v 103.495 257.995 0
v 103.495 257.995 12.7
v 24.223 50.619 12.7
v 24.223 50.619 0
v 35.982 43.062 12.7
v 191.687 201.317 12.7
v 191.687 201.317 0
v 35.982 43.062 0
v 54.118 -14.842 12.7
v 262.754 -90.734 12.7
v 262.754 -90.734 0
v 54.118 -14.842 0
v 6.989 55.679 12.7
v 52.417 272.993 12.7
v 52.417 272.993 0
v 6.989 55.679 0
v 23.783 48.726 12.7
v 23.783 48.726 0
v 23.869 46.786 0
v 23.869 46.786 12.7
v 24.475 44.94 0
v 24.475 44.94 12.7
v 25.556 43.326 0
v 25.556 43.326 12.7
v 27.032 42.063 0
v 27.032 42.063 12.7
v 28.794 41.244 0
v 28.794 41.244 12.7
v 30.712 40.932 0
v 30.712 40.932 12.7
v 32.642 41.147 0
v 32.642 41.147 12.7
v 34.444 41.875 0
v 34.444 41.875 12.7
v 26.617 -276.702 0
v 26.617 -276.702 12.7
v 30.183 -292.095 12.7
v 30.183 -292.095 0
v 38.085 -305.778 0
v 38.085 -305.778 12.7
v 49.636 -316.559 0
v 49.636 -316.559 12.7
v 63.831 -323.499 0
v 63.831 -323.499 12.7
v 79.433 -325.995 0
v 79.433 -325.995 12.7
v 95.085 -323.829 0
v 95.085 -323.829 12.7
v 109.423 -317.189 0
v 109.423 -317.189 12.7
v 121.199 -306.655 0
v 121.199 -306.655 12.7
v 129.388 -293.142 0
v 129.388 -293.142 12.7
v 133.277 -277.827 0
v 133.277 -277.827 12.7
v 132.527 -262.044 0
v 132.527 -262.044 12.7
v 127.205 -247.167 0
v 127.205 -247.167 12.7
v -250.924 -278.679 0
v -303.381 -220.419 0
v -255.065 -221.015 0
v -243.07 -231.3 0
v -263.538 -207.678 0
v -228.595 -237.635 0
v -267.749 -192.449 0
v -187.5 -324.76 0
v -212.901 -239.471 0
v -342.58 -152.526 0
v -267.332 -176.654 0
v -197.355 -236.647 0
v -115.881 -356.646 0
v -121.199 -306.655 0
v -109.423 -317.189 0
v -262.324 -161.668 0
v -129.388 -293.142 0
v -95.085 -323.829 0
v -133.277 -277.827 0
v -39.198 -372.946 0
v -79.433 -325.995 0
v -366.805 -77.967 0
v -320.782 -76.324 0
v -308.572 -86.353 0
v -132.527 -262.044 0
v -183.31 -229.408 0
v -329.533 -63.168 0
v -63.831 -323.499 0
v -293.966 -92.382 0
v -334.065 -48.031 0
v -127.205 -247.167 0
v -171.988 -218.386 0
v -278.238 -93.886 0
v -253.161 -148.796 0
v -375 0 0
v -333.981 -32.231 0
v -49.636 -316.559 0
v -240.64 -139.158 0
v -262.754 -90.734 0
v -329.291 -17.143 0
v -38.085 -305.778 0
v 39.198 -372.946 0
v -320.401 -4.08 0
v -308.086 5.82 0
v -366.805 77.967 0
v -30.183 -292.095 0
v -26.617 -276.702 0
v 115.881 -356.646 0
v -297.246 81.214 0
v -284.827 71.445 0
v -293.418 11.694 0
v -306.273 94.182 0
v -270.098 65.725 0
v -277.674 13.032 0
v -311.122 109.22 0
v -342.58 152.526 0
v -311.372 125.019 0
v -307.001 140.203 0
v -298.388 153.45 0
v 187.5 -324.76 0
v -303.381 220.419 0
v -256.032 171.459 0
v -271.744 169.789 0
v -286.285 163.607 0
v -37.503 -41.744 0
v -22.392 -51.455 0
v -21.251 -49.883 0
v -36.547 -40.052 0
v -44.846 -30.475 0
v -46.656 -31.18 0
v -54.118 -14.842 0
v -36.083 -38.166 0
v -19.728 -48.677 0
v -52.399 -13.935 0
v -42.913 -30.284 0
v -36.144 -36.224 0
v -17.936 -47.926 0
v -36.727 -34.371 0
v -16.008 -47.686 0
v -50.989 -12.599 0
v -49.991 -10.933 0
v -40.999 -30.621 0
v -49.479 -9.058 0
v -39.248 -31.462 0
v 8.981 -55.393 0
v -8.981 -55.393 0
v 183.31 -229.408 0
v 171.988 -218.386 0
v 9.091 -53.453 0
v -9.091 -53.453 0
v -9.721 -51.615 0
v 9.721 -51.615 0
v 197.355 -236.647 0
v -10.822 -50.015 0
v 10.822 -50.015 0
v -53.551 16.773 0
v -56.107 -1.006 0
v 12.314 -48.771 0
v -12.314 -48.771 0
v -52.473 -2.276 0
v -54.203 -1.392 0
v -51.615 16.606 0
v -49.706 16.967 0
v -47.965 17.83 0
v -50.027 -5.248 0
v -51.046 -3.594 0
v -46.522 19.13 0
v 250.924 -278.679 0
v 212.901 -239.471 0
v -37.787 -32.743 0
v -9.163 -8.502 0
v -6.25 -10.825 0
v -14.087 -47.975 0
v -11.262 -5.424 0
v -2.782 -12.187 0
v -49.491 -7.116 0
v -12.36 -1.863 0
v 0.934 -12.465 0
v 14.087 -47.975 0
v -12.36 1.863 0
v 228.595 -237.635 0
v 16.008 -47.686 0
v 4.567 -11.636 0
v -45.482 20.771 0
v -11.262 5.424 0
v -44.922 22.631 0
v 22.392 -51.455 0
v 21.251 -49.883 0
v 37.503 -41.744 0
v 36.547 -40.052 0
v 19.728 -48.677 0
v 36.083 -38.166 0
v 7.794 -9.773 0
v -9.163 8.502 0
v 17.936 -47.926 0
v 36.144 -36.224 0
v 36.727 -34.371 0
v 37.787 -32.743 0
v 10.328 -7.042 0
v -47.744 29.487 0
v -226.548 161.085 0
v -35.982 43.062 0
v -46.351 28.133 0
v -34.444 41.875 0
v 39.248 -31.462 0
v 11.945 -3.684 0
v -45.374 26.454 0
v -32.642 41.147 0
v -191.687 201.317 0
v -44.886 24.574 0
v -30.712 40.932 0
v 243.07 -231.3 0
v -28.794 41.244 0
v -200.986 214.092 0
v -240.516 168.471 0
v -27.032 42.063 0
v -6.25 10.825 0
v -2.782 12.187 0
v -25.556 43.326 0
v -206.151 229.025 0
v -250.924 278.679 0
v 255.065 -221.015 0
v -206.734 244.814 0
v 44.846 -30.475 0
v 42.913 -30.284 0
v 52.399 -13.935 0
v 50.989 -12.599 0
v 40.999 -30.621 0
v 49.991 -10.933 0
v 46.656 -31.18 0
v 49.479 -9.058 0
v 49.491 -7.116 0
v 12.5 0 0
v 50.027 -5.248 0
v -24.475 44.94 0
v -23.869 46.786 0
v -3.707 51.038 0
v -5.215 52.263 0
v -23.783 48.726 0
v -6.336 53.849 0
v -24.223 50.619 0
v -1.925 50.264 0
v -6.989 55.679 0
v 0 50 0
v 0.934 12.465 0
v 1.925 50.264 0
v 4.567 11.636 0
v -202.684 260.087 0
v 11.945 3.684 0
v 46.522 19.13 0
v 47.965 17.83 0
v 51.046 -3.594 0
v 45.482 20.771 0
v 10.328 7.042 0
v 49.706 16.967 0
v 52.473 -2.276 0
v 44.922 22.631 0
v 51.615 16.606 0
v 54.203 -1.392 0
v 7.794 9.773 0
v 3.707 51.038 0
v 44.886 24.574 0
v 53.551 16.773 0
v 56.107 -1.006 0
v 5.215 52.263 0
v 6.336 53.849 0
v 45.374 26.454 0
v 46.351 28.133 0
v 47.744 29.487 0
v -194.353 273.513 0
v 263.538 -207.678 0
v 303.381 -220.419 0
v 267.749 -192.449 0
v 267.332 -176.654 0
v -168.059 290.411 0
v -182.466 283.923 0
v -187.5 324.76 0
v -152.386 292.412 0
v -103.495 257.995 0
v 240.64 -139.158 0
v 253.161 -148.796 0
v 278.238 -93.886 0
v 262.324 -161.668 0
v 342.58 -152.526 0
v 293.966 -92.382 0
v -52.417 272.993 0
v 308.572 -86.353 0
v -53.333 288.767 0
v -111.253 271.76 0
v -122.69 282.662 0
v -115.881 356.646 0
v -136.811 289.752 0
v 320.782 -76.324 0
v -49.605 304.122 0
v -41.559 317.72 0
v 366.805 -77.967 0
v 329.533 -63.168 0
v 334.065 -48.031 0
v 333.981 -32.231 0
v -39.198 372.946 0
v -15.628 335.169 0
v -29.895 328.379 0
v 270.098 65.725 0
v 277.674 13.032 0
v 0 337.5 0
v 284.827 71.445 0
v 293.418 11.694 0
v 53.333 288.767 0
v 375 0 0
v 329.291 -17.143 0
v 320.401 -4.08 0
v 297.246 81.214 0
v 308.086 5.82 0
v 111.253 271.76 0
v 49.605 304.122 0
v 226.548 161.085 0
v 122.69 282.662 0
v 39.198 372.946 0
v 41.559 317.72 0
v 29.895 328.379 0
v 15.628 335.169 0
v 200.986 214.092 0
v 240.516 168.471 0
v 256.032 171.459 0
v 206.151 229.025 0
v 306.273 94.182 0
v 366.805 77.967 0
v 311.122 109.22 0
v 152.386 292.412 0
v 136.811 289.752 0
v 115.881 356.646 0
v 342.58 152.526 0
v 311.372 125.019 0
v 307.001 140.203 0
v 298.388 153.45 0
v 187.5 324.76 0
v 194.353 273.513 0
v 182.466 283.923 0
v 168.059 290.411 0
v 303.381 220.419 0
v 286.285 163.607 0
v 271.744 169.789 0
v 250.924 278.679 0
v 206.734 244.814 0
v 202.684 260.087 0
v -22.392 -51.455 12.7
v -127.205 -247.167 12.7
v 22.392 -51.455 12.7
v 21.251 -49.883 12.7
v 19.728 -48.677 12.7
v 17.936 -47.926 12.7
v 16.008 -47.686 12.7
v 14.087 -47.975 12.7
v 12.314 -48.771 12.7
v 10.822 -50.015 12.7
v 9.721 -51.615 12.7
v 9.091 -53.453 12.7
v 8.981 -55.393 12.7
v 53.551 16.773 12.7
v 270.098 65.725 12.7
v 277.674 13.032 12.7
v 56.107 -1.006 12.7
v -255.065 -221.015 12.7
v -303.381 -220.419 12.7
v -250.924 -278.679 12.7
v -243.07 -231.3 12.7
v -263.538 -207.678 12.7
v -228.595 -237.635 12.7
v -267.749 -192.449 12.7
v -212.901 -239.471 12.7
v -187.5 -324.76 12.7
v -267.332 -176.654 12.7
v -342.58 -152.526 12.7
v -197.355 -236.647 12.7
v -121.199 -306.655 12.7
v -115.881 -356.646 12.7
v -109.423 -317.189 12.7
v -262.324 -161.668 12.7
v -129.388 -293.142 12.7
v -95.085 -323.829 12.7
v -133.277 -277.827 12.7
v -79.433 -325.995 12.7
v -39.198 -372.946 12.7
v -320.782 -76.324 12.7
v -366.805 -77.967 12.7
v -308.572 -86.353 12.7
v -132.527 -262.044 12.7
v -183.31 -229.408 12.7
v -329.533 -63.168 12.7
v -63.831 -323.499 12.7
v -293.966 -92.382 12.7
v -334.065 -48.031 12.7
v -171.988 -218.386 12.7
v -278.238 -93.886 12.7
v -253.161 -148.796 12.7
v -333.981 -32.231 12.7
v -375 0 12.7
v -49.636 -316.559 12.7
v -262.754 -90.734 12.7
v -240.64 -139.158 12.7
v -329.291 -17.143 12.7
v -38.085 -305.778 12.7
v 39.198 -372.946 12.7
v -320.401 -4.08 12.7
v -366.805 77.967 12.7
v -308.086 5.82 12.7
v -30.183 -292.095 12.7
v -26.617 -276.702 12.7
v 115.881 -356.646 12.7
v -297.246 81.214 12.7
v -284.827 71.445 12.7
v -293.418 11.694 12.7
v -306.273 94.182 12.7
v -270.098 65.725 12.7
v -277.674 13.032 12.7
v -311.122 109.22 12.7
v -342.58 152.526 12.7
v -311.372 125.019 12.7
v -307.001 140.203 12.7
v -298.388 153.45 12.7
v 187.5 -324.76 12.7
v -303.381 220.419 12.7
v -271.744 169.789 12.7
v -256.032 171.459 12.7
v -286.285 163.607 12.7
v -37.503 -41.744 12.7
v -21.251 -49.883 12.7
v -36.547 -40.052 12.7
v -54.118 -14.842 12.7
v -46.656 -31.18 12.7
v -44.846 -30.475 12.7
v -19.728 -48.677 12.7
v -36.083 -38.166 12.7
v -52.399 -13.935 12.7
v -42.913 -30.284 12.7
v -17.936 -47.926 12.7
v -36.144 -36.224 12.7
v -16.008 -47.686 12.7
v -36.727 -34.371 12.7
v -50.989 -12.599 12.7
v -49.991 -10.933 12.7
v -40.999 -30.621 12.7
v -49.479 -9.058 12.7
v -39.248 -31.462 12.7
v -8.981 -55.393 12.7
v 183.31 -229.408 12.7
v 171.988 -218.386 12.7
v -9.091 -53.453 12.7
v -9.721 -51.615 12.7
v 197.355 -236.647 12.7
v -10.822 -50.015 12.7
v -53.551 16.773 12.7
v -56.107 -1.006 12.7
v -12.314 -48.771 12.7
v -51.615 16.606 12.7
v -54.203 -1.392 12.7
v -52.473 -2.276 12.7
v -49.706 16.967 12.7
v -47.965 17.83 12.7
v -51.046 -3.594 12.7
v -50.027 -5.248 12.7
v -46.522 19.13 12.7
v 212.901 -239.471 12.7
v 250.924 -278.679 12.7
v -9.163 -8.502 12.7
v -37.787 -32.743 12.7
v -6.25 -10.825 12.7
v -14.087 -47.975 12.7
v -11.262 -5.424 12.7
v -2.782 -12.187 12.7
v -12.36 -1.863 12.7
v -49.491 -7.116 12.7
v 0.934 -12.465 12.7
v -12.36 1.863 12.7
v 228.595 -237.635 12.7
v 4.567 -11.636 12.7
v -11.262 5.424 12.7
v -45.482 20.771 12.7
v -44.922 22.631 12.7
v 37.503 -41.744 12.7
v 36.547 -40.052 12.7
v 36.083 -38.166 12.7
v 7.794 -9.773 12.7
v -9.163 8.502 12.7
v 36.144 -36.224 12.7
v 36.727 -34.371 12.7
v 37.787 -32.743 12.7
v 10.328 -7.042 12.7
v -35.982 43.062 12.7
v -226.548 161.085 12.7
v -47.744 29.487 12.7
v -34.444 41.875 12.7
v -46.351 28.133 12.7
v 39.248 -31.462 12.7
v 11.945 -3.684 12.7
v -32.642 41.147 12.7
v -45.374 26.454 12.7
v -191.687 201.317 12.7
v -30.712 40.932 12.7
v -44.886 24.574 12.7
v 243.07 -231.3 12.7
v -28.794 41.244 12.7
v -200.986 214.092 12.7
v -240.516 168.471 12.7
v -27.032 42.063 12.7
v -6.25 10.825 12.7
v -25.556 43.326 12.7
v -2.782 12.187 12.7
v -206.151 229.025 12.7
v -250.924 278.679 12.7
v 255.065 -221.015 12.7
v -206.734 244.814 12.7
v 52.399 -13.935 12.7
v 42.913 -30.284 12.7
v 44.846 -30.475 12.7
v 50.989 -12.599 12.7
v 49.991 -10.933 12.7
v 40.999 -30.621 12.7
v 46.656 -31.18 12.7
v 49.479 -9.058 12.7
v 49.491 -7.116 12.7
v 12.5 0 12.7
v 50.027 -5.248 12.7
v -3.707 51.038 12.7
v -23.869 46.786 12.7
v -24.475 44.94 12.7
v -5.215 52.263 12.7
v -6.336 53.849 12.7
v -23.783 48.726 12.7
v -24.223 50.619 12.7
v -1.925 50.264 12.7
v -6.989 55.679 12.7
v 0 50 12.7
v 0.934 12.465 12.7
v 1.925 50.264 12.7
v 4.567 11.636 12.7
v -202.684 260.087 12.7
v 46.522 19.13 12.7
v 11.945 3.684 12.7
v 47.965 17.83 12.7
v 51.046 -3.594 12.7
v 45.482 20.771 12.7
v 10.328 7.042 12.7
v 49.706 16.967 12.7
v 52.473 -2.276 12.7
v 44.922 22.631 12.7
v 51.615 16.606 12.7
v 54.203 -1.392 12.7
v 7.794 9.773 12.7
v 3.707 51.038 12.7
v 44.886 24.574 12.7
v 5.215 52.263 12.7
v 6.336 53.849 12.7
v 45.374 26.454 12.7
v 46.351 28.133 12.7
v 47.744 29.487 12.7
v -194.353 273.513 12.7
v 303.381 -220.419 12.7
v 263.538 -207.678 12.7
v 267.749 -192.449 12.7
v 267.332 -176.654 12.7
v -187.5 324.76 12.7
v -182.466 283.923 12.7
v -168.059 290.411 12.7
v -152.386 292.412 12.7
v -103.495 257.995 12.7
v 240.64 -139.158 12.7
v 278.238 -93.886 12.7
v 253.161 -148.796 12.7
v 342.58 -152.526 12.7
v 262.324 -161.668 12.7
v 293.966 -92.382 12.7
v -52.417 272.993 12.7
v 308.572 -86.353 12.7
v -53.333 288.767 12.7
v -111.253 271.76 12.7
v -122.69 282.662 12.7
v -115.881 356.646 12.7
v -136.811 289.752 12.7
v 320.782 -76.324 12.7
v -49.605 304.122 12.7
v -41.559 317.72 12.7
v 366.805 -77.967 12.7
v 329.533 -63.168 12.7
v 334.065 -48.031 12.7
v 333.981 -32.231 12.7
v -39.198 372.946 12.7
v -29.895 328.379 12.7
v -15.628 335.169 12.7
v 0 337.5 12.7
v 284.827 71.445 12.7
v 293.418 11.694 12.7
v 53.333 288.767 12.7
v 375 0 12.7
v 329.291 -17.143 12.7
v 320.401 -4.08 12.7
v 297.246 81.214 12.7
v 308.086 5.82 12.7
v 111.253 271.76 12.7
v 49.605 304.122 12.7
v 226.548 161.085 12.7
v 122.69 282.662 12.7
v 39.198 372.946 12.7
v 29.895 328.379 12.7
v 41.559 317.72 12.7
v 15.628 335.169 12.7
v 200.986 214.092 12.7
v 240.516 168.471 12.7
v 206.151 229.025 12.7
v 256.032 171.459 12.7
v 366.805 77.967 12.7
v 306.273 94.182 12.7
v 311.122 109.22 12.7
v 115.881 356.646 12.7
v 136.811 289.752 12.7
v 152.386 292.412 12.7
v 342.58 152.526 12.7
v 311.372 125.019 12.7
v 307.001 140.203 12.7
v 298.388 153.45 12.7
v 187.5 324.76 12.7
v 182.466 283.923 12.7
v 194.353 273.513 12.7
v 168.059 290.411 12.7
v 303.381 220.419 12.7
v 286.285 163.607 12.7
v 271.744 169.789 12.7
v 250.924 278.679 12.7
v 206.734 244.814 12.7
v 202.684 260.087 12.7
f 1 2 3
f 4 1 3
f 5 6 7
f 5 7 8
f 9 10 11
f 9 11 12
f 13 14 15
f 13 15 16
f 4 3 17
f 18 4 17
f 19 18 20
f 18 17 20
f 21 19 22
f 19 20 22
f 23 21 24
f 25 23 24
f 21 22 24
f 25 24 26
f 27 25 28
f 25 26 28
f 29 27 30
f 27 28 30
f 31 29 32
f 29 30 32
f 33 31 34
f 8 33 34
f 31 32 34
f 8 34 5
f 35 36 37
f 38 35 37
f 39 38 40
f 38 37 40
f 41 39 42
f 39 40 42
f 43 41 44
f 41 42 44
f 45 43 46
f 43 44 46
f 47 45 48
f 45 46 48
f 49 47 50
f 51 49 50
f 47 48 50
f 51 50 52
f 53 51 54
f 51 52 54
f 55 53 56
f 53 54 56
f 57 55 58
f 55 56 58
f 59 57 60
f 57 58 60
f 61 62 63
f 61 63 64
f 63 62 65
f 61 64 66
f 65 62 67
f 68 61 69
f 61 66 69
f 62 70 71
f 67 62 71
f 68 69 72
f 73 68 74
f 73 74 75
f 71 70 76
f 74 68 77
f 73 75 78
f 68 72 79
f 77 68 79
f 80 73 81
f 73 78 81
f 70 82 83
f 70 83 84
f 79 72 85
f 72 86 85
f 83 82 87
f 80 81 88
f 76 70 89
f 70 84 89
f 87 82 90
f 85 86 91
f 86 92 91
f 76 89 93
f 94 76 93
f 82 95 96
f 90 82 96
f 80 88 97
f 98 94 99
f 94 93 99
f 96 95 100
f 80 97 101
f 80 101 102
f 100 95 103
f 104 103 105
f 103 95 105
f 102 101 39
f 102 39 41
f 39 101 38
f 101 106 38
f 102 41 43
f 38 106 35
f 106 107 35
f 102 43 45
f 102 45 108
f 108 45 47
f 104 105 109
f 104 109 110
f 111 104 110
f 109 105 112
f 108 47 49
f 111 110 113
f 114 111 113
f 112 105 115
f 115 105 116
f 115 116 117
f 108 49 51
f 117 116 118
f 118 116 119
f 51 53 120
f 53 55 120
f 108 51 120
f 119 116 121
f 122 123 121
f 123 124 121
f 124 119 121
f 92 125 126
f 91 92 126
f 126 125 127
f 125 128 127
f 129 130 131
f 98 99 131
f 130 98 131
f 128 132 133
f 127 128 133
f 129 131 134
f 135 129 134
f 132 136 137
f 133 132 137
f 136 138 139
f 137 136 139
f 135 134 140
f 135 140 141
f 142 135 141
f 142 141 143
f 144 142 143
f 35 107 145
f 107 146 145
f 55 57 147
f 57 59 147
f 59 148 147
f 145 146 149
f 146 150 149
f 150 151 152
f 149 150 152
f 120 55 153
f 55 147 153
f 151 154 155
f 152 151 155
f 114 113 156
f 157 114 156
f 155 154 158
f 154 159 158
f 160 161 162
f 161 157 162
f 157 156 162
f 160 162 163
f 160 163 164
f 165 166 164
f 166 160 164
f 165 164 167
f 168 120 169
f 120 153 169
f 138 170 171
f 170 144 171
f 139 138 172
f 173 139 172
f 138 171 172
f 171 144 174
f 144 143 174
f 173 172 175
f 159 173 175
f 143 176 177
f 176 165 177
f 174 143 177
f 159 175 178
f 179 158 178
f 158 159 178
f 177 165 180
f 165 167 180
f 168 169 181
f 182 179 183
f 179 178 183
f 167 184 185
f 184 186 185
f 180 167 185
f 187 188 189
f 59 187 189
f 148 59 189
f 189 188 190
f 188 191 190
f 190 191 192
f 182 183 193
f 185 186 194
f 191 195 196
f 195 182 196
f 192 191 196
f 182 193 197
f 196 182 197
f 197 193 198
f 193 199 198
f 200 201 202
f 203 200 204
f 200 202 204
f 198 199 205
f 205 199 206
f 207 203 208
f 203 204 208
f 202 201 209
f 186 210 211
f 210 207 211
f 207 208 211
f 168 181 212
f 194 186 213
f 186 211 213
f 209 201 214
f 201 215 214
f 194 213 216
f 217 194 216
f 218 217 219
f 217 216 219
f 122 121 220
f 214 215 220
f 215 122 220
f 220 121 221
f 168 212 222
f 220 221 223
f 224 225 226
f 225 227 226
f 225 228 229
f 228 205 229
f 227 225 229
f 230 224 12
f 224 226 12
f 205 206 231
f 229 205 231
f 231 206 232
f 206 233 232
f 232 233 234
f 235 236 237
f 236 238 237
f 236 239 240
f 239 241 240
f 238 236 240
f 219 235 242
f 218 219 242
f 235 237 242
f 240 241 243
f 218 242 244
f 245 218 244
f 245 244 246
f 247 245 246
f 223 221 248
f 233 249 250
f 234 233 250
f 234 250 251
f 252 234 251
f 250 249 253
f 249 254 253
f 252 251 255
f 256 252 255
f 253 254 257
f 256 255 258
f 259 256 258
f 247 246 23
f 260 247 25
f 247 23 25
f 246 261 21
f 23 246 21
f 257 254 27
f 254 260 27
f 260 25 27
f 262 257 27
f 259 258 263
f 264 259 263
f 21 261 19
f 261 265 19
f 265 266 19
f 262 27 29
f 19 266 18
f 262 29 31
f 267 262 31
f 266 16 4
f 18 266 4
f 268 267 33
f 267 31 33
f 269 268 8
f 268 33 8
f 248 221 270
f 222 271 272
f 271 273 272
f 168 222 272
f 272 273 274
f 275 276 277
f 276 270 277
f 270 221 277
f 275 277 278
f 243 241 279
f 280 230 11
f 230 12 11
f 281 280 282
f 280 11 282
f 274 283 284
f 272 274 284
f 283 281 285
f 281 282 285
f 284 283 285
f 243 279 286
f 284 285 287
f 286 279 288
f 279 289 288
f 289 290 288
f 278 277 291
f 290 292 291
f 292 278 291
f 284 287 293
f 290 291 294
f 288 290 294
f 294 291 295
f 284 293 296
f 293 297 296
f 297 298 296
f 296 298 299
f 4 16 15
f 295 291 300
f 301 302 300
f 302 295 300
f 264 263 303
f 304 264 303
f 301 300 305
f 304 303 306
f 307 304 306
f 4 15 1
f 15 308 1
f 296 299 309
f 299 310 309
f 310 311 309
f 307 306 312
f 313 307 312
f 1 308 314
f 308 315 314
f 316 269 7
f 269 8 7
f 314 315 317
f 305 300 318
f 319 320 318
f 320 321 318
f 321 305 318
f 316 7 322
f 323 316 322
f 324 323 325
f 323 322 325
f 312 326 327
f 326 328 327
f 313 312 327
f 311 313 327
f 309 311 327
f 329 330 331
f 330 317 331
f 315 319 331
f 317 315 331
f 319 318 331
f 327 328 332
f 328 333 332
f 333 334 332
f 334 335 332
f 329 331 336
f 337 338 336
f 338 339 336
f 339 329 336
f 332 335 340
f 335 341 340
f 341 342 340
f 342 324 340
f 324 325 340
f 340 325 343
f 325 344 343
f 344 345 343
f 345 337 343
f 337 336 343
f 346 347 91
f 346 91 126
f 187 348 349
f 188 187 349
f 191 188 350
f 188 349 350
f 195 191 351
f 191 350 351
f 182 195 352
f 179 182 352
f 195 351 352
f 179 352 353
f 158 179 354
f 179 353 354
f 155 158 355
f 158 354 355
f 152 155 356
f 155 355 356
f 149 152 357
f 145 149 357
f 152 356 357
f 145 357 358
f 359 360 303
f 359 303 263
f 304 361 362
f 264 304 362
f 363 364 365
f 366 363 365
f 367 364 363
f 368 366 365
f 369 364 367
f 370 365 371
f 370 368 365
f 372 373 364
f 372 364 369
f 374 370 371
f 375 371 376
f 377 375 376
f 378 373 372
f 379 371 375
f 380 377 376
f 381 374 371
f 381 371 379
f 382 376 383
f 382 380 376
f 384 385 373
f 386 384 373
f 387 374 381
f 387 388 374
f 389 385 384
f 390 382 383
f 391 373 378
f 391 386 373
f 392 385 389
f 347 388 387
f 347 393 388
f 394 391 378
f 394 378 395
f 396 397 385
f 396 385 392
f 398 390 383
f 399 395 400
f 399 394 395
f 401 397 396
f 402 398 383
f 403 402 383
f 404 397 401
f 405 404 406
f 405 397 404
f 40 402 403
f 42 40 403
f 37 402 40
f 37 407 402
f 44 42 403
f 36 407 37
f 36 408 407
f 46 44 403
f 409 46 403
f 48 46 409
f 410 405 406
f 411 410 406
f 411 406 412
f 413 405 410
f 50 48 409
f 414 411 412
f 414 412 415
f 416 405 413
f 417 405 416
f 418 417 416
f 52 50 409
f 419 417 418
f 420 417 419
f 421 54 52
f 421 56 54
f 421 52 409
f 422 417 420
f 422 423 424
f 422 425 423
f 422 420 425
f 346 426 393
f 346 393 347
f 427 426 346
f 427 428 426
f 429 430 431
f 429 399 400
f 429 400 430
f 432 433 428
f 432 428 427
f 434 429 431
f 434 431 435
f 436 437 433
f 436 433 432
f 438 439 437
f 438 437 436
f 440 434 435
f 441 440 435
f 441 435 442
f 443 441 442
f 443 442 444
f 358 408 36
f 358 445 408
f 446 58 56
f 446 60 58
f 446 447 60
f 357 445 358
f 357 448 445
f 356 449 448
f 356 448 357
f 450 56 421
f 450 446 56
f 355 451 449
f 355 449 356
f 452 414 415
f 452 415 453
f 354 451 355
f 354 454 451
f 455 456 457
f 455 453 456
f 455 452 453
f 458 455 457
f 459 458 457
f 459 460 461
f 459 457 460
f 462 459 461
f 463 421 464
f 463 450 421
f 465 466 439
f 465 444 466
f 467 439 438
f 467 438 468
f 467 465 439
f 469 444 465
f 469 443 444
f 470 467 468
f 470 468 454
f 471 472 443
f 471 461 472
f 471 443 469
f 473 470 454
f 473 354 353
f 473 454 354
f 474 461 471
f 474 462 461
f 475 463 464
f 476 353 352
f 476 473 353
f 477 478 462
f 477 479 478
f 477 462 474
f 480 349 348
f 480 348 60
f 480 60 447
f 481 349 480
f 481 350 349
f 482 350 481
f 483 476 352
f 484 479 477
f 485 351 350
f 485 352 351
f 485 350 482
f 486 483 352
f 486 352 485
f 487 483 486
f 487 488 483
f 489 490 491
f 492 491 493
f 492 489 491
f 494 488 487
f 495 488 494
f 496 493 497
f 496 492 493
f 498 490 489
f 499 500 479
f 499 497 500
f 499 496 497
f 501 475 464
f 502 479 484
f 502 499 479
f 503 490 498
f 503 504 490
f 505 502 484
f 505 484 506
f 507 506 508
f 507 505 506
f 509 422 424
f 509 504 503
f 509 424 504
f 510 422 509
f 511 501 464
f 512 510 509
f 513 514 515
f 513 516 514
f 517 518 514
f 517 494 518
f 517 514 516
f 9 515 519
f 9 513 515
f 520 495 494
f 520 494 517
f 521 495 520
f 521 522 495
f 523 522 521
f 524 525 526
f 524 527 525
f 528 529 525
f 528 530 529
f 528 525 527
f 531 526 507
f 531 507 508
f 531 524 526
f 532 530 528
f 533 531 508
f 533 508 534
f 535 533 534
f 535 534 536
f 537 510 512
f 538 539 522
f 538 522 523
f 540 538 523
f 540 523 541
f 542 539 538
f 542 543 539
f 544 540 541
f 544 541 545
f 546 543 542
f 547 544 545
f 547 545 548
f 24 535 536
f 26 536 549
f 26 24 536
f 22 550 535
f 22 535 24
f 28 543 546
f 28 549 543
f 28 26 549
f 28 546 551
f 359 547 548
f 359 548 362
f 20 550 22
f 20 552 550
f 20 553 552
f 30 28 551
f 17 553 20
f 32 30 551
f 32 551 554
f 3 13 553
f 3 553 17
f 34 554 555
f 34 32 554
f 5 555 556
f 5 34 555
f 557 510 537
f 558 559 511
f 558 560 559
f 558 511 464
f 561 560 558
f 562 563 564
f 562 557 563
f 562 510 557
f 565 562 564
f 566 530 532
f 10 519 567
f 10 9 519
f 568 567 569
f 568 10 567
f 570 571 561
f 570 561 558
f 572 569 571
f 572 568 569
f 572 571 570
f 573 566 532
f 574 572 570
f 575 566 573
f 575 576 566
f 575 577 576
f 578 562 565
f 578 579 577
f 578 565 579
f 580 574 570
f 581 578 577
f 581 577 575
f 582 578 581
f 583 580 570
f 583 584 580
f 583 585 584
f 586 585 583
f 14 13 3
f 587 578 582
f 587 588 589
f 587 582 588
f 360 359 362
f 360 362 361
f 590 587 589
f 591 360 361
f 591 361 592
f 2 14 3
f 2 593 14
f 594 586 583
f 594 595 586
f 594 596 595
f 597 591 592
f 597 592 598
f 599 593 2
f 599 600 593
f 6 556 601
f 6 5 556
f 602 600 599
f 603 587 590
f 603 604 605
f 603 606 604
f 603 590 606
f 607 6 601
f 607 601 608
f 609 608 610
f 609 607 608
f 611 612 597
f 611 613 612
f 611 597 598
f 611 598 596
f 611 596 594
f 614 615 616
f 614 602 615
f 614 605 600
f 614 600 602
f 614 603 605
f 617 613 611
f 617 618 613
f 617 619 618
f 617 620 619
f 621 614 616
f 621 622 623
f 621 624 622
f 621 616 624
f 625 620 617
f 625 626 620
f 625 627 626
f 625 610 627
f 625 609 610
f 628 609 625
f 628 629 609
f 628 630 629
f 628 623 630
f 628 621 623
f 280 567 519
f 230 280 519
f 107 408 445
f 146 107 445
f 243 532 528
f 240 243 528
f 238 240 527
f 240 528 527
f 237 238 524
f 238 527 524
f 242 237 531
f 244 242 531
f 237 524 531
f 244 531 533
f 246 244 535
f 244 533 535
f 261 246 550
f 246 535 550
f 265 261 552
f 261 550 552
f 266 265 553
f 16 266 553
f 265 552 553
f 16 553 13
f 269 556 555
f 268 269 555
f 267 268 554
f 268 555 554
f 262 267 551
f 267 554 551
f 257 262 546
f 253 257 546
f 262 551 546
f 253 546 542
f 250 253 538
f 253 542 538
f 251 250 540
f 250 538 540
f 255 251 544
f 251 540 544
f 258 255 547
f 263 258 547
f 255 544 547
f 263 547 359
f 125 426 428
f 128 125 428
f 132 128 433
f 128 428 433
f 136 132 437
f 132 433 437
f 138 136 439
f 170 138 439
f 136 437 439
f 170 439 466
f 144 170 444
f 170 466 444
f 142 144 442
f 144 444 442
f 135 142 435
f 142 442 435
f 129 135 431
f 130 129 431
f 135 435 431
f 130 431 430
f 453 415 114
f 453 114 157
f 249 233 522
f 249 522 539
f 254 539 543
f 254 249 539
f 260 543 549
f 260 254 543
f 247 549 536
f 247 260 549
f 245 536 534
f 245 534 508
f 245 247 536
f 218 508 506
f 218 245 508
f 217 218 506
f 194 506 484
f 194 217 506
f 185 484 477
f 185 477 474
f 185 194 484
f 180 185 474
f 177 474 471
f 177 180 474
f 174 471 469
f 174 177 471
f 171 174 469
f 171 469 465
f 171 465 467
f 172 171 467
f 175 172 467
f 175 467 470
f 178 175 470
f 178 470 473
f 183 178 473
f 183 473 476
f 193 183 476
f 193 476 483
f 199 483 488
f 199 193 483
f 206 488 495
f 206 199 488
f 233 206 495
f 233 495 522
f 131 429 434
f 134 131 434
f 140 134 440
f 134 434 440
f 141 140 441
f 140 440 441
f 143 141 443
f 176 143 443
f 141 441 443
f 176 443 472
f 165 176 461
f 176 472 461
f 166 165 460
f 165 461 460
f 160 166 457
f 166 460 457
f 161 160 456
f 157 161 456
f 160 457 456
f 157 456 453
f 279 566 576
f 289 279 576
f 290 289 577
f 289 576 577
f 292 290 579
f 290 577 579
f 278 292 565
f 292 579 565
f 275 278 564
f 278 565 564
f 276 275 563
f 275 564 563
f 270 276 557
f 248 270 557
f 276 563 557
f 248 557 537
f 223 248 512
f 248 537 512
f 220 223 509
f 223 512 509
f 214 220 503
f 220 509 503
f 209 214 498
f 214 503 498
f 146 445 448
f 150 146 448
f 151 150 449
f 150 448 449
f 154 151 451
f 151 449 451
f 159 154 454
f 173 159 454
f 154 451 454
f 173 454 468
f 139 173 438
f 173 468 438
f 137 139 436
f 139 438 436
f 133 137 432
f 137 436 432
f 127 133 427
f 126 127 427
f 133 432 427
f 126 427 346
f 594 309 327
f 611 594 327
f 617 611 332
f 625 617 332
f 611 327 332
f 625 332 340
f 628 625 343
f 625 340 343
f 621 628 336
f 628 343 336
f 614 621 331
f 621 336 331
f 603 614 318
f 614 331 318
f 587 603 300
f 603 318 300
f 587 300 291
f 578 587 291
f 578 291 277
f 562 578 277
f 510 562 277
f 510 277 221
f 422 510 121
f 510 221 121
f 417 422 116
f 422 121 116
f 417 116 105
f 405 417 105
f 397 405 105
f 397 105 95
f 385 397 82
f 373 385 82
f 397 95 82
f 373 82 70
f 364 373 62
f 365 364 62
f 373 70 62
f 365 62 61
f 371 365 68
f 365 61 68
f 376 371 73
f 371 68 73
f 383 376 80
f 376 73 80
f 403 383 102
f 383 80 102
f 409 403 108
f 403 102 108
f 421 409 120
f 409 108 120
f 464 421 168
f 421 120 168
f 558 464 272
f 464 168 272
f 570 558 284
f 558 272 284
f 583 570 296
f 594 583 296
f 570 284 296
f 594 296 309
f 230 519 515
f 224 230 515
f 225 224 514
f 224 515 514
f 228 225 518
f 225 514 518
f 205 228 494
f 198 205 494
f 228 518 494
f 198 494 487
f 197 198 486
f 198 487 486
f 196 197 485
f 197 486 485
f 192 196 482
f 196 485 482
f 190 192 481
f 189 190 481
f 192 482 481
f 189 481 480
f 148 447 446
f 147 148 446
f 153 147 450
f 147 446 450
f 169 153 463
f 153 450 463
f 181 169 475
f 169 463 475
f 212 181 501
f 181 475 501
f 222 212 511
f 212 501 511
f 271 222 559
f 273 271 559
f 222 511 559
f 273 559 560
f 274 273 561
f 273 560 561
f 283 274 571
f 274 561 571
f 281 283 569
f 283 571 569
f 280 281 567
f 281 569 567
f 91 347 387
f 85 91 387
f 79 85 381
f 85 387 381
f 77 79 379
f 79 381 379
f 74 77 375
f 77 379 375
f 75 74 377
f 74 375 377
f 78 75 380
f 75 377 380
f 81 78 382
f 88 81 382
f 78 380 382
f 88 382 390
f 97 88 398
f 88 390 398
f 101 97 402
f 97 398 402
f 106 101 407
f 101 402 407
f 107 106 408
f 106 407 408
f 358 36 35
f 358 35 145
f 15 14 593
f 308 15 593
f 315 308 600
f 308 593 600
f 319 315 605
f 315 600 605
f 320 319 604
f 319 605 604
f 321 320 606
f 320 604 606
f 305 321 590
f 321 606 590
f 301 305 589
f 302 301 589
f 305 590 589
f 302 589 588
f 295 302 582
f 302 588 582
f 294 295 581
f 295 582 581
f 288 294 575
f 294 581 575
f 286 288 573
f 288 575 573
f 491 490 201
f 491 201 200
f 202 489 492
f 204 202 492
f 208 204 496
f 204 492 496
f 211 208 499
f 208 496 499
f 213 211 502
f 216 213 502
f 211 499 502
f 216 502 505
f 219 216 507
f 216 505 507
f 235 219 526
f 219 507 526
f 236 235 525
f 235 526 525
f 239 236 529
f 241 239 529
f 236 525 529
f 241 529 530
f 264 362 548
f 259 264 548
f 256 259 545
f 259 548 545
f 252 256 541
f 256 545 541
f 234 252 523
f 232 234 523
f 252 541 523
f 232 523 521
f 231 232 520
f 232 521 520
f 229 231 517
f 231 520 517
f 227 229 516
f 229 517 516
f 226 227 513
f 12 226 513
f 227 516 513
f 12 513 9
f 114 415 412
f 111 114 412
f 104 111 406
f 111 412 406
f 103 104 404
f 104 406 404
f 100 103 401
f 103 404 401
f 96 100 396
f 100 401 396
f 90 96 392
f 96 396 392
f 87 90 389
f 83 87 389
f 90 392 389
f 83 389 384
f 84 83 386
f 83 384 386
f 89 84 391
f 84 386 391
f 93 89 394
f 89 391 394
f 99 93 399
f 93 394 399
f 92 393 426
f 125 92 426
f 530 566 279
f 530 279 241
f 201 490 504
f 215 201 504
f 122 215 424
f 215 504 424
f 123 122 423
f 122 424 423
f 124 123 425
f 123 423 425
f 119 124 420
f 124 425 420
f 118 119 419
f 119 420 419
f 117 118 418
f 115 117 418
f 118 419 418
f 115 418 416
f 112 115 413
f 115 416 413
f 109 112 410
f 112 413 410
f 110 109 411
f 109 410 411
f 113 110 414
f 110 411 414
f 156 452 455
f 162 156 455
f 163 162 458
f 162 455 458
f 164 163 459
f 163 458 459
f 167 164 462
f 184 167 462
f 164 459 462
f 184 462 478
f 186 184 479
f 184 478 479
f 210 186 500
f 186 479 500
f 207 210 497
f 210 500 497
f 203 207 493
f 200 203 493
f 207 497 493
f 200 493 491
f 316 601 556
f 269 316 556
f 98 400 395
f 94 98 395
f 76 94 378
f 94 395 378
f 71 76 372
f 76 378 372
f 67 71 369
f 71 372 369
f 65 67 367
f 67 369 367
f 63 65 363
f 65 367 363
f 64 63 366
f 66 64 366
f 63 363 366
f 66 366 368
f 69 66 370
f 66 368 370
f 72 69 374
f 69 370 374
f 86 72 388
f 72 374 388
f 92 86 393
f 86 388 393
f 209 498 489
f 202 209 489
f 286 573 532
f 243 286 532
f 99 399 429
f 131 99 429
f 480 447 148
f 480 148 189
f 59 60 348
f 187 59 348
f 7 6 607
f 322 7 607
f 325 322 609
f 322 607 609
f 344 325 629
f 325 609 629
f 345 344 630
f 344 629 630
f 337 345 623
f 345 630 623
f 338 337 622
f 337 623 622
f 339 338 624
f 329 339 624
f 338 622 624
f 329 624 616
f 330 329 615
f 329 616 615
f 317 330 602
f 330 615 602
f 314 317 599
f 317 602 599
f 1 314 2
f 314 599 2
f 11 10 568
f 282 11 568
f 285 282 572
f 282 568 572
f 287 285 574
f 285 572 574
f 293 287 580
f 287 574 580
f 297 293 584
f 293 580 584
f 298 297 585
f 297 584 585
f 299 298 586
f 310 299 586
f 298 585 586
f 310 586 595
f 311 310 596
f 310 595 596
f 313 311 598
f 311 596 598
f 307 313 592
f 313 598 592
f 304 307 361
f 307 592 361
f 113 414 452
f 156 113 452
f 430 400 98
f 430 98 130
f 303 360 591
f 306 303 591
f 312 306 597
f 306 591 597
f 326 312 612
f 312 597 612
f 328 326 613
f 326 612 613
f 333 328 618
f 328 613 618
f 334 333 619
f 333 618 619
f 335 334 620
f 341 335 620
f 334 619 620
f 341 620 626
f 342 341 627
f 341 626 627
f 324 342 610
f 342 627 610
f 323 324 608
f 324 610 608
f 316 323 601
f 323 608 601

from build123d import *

# Parameters (mm, degrees)
SKETCH_R           = 375
SKETCH_R_2         = 12.5
PAD_DEPTH          = 12.7
POCKET_DEPTH       = 12.7
POLARPATTERN_COUNT = 11


with BuildPart() as part:
    # Sketch → Pad (new body)
    with BuildSketch(Plane.XY):
        Circle(SKETCH_R)
        Circle(SKETCH_R_2, mode=Mode.SUBTRACT)
    extrude(amount=PAD_DEPTH)

    # Sketch001 (on Face4 of Pad) → Pocket (cut)
    with BuildSketch(Plane.XY.offset(12.7)):
        with BuildLine():
            ThreePointArc((52.416839, 272.99275), (0, 337.5), (-52.416839, 272.99275))
            Line((-52.416839, 272.99275), (-6.988912, 55.679))
            ThreePointArc((-6.988912, 55.679), (0, 50), (6.988912, 55.679))
            Line((52.416839, 272.99275), (6.988912, 55.679))
        make_face()
    pocket = extrude(amount=-POCKET_DEPTH, mode=Mode.SUBTRACT)

    # PolarPattern: Pocket ×11 about axis
    polarpattern_axis = Axis((0, 0, 12.7), (0, 0, 1))
    for i in range(1, POLARPATTERN_COUNT):
        add(pocket.rotate(polarpattern_axis, i * 360 / POLARPATTERN_COUNT), mode=Mode.SUBTRACT)


solid = part.part
